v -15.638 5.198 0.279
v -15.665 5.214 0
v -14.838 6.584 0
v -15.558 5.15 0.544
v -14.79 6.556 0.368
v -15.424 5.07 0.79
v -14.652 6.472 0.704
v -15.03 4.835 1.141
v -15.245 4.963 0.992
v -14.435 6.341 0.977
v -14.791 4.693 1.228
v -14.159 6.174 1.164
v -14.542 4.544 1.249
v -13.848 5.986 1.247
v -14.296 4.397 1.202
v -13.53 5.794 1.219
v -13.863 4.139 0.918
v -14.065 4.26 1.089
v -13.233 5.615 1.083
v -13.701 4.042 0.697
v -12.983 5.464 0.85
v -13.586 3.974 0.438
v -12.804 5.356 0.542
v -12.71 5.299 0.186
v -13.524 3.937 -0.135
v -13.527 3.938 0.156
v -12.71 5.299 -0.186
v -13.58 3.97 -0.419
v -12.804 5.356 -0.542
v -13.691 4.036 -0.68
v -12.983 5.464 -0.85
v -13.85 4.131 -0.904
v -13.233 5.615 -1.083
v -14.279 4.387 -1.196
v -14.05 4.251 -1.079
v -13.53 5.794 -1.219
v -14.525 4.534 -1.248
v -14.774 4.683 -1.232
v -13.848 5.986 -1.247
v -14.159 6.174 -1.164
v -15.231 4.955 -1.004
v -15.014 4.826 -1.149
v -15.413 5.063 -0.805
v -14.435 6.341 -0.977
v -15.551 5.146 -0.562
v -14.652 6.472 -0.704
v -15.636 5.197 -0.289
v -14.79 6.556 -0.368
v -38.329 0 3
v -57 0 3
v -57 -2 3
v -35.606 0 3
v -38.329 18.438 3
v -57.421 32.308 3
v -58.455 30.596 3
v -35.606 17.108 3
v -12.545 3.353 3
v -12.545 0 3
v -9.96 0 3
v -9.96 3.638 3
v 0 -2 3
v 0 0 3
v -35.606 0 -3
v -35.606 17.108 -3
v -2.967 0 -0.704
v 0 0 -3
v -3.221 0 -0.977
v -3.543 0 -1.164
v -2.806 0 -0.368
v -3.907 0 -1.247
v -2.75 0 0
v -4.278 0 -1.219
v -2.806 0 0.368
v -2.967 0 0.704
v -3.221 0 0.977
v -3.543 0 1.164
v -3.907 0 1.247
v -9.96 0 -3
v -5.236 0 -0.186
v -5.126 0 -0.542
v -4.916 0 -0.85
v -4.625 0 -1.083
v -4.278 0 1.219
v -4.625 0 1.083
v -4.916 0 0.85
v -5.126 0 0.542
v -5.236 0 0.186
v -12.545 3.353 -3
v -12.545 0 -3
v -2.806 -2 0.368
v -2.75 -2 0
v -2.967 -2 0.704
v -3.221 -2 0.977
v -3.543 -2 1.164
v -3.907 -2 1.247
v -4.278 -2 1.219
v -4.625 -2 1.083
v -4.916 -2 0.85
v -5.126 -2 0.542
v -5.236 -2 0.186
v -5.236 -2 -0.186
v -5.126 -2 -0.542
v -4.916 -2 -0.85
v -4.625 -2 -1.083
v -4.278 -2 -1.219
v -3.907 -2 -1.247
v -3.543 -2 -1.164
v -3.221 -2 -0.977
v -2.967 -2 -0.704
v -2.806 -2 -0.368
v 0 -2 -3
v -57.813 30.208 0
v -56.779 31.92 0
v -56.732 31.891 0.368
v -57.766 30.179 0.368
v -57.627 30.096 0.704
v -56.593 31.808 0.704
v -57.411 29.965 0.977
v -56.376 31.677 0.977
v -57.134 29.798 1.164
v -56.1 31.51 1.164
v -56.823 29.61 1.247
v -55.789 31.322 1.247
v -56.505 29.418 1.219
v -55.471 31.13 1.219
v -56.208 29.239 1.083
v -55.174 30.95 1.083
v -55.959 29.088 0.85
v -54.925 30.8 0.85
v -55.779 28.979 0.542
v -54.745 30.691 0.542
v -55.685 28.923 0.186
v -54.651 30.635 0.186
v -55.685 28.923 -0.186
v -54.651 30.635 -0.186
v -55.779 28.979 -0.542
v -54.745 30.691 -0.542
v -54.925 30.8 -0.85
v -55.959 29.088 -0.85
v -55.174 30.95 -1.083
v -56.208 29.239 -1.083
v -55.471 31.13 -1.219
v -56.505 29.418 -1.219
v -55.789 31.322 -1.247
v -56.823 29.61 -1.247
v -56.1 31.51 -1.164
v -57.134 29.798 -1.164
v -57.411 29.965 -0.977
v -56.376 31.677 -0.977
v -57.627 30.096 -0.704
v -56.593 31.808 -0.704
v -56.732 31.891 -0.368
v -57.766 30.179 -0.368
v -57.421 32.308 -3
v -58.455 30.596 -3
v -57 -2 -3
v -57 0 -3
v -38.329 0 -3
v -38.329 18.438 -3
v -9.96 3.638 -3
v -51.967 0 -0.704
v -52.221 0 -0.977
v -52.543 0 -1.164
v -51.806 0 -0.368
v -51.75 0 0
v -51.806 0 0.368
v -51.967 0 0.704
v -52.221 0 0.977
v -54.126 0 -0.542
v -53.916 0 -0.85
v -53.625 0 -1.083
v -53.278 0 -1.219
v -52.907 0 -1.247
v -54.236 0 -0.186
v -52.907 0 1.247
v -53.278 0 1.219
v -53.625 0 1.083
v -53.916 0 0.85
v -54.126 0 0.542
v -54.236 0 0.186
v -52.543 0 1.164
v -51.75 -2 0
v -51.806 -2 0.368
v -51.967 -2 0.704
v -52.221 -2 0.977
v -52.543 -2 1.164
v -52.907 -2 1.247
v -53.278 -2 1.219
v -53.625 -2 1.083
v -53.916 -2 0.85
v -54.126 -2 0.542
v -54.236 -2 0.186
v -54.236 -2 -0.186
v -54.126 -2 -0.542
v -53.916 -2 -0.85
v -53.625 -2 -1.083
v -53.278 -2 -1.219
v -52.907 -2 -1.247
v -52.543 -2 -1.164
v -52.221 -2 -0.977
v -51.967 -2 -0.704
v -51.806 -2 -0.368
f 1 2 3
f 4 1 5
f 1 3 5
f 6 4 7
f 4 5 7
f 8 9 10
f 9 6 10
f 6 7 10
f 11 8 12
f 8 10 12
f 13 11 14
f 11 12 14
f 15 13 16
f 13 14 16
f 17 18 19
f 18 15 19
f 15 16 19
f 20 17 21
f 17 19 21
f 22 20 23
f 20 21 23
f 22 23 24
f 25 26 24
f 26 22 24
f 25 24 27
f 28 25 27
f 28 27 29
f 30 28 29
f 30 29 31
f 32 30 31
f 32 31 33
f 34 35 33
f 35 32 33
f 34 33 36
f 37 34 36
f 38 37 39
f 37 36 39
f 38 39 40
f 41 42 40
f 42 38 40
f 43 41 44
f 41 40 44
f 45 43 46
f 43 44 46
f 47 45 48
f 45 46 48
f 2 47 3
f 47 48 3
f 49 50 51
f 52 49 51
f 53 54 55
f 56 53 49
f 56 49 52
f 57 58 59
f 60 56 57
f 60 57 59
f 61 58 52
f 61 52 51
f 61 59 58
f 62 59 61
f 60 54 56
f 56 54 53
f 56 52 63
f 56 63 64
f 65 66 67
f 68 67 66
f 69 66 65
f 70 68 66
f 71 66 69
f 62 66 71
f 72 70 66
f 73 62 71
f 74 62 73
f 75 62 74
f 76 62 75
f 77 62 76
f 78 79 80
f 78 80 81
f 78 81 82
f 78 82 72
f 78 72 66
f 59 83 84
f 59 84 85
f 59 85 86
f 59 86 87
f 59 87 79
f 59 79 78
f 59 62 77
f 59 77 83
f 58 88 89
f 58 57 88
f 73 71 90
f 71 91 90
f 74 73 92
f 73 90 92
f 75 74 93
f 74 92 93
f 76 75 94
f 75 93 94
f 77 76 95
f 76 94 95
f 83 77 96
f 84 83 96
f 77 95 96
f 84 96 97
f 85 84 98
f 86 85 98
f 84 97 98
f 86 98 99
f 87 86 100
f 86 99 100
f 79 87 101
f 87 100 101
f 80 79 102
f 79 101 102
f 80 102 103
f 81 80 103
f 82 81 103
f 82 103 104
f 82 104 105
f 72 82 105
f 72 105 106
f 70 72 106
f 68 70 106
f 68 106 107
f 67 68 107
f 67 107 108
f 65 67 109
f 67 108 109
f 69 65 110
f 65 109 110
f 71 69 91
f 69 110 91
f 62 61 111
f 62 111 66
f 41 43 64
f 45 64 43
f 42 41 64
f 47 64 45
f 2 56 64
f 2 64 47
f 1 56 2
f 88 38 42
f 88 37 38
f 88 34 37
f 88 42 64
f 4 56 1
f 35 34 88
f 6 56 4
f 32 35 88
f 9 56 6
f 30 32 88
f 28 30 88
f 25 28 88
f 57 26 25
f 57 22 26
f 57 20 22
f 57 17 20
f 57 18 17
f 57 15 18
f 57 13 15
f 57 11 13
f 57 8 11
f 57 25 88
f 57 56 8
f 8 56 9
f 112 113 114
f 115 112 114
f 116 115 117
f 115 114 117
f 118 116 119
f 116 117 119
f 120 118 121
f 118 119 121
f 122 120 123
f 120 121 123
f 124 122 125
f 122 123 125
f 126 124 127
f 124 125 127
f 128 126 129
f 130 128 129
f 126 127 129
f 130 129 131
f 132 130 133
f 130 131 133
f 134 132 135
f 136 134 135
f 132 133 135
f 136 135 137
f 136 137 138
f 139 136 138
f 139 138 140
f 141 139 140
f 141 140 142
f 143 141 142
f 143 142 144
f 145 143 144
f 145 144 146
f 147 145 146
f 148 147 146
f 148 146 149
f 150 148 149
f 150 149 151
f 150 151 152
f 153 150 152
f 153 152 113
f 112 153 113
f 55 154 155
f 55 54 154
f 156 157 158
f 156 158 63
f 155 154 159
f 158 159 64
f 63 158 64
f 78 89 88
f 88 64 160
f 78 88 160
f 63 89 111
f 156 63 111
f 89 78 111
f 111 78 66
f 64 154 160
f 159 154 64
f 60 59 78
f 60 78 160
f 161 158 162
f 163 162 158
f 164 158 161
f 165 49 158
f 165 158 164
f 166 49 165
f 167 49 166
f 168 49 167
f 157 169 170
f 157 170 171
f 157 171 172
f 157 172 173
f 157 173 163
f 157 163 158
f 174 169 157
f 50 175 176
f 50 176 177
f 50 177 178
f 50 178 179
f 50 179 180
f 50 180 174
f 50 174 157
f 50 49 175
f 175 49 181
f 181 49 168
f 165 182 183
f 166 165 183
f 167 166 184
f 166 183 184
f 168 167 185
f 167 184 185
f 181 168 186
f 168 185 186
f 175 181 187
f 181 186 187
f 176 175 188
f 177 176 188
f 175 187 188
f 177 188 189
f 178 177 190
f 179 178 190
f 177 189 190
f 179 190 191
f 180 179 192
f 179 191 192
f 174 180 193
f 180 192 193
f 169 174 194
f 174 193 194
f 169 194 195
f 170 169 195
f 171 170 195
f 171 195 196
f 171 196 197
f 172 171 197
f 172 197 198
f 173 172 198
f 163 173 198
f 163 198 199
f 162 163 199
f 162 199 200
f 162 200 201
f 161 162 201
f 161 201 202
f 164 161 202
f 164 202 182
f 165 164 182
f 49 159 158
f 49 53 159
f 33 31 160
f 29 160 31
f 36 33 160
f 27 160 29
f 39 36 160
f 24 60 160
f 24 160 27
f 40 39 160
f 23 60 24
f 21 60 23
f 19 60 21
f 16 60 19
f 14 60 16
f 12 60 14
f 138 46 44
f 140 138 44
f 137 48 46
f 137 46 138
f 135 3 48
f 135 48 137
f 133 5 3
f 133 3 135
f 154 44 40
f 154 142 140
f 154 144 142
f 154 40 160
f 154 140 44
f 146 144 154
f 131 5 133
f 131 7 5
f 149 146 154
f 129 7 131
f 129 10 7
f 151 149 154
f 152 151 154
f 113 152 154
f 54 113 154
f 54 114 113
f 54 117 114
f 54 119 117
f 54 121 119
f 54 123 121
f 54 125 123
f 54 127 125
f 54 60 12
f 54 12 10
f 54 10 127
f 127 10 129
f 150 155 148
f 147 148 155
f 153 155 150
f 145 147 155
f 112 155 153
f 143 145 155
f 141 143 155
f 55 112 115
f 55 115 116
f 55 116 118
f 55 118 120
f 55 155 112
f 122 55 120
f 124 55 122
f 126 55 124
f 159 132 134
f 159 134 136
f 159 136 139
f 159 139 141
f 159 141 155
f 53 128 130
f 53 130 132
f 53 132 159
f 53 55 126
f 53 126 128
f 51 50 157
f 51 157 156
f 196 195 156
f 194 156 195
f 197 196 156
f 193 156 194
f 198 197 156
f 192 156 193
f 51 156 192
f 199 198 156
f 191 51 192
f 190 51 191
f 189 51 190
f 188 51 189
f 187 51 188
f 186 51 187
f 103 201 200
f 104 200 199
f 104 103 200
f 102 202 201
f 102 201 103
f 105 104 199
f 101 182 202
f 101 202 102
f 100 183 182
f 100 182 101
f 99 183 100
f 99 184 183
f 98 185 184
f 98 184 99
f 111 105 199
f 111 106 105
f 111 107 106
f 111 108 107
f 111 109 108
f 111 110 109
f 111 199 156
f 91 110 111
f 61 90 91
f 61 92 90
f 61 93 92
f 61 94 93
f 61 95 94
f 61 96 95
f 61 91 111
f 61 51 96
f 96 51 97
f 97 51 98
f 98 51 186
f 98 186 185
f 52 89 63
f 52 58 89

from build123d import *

# Parameters (mm, degrees)
F1_DEPTH = 3
F2_R     = 1.25
F3_DEPTH = 12.5
F4_R     = 1.25
F5_DEPTH = 4


# Not quite as in the source:
# - a feature names something its author has since deleted; it is built from what else it names


with BuildPart() as f1:
    # F0 (on Top) → F1 (new body, symmetric)
    with BuildSketch(Plane.XY):
        Polygon((-38.3288674057, 0), (-57, 0), (-57, -2), (0, -2), (0, 0), (-3.9376540358, 0), (-6.9237630814, 0), (-9.9603020251, 0), (-9.9603020251, 3.6380901354), (-57.4212029734, 32.3077111831), (-58.4553107619, 30.595805496), (-38.3288674057, 18.4380610677), align=None)
        Polygon((-35.6059968472, 0), (-35.6059968472, 17.1079821885), (-12.5451418841, 3.3529622977), (-12.5451418841, 0), align=None, mode=Mode.SUBTRACT)
    extrude(amount=F1_DEPTH, both=True)

    # F2 (on face) → F3 (cut, symmetric)
    with BuildSketch(Plane.XZ.offset(2)):
        with Locations((-53, 0)):
            Circle(F2_R)
        with Locations((-4, 0)):
            Circle(F2_R)
    extrude(amount=F3_DEPTH, both=True, mode=Mode.SUBTRACT)

    # F4 (on face) → F5 (cut)
    with BuildSketch(Plane(origin=(-1.0527110533, -1.7427023171, 0), x_dir=(-0.8559528436, 0.5170538943, 0), z_dir=(0.5170538943, 0.8559528436, 0))):
        with Locations((63.8546698487, 0)):
            Circle(F4_R)
        with Locations((14.8546698487, 0)):
            Circle(F4_R)
    extrude(amount=-F5_DEPTH, mode=Mode.SUBTRACT)


solid = f1.part
